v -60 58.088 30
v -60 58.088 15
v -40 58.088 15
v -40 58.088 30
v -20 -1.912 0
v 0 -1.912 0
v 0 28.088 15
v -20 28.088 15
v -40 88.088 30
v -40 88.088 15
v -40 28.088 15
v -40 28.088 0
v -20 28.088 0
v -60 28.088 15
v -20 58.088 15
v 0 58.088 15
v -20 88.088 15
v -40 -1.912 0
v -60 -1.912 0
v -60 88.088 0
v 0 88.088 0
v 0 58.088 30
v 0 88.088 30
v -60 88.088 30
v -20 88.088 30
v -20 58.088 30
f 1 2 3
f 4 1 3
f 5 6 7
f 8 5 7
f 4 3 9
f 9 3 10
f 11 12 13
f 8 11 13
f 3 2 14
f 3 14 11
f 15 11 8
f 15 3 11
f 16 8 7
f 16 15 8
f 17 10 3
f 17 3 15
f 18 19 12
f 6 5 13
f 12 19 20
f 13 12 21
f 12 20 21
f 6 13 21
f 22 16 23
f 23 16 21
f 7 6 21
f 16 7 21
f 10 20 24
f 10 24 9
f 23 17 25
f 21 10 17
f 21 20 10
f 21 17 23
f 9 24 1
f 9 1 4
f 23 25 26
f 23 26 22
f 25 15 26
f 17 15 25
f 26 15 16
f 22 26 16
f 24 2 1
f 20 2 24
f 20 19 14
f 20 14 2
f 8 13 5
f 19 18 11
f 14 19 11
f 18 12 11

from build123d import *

# Parameters (mm, degrees)
F0_W     = 60
F0_H     = 90
F1_DEPTH = 15
F2_W     = 20
F2_H     = 30
F3_DEPTH = 15
F5_DEPTH = 60
F6_W     = 20
F6_H     = 30
F7_DEPTH = 15


with BuildPart() as f1:
    # F0 (on Top) → F1 (new body)
    with BuildSketch(Plane.XY):
        with Locations((-30, 43.088234)):
            Rectangle(F0_W, F0_H)
    extrude(amount=F1_DEPTH)

    # F2 (on face) → F3 (join)
    with BuildSketch(Plane.XY.offset(15)):
        with Locations((-50, 73.088234)):
            Rectangle(F2_W, F2_H)
        with Locations((-10, 73.088234)):
            Rectangle(F2_W, F2_H)
    extrude(amount=F3_DEPTH)

    # F4 (on face) → F5 (cut)
    with BuildSketch(Plane.YZ):
        Polygon((-1.911766, 15), (-1.911766, 0), (28.088234, 15), align=None)
    extrude(amount=-F5_DEPTH, mode=Mode.SUBTRACT)

    # F6 (on face) → F7 (cut)
    with BuildSketch(Plane(origin=(0, 0, 0), x_dir=(1, 0, 0), z_dir=(0, 0, -1))):
        with Locations((-30, -13.088234)):
            Rectangle(F6_W, F6_H)
    extrude(amount=-F7_DEPTH, mode=Mode.SUBTRACT)


solid = f1.part
